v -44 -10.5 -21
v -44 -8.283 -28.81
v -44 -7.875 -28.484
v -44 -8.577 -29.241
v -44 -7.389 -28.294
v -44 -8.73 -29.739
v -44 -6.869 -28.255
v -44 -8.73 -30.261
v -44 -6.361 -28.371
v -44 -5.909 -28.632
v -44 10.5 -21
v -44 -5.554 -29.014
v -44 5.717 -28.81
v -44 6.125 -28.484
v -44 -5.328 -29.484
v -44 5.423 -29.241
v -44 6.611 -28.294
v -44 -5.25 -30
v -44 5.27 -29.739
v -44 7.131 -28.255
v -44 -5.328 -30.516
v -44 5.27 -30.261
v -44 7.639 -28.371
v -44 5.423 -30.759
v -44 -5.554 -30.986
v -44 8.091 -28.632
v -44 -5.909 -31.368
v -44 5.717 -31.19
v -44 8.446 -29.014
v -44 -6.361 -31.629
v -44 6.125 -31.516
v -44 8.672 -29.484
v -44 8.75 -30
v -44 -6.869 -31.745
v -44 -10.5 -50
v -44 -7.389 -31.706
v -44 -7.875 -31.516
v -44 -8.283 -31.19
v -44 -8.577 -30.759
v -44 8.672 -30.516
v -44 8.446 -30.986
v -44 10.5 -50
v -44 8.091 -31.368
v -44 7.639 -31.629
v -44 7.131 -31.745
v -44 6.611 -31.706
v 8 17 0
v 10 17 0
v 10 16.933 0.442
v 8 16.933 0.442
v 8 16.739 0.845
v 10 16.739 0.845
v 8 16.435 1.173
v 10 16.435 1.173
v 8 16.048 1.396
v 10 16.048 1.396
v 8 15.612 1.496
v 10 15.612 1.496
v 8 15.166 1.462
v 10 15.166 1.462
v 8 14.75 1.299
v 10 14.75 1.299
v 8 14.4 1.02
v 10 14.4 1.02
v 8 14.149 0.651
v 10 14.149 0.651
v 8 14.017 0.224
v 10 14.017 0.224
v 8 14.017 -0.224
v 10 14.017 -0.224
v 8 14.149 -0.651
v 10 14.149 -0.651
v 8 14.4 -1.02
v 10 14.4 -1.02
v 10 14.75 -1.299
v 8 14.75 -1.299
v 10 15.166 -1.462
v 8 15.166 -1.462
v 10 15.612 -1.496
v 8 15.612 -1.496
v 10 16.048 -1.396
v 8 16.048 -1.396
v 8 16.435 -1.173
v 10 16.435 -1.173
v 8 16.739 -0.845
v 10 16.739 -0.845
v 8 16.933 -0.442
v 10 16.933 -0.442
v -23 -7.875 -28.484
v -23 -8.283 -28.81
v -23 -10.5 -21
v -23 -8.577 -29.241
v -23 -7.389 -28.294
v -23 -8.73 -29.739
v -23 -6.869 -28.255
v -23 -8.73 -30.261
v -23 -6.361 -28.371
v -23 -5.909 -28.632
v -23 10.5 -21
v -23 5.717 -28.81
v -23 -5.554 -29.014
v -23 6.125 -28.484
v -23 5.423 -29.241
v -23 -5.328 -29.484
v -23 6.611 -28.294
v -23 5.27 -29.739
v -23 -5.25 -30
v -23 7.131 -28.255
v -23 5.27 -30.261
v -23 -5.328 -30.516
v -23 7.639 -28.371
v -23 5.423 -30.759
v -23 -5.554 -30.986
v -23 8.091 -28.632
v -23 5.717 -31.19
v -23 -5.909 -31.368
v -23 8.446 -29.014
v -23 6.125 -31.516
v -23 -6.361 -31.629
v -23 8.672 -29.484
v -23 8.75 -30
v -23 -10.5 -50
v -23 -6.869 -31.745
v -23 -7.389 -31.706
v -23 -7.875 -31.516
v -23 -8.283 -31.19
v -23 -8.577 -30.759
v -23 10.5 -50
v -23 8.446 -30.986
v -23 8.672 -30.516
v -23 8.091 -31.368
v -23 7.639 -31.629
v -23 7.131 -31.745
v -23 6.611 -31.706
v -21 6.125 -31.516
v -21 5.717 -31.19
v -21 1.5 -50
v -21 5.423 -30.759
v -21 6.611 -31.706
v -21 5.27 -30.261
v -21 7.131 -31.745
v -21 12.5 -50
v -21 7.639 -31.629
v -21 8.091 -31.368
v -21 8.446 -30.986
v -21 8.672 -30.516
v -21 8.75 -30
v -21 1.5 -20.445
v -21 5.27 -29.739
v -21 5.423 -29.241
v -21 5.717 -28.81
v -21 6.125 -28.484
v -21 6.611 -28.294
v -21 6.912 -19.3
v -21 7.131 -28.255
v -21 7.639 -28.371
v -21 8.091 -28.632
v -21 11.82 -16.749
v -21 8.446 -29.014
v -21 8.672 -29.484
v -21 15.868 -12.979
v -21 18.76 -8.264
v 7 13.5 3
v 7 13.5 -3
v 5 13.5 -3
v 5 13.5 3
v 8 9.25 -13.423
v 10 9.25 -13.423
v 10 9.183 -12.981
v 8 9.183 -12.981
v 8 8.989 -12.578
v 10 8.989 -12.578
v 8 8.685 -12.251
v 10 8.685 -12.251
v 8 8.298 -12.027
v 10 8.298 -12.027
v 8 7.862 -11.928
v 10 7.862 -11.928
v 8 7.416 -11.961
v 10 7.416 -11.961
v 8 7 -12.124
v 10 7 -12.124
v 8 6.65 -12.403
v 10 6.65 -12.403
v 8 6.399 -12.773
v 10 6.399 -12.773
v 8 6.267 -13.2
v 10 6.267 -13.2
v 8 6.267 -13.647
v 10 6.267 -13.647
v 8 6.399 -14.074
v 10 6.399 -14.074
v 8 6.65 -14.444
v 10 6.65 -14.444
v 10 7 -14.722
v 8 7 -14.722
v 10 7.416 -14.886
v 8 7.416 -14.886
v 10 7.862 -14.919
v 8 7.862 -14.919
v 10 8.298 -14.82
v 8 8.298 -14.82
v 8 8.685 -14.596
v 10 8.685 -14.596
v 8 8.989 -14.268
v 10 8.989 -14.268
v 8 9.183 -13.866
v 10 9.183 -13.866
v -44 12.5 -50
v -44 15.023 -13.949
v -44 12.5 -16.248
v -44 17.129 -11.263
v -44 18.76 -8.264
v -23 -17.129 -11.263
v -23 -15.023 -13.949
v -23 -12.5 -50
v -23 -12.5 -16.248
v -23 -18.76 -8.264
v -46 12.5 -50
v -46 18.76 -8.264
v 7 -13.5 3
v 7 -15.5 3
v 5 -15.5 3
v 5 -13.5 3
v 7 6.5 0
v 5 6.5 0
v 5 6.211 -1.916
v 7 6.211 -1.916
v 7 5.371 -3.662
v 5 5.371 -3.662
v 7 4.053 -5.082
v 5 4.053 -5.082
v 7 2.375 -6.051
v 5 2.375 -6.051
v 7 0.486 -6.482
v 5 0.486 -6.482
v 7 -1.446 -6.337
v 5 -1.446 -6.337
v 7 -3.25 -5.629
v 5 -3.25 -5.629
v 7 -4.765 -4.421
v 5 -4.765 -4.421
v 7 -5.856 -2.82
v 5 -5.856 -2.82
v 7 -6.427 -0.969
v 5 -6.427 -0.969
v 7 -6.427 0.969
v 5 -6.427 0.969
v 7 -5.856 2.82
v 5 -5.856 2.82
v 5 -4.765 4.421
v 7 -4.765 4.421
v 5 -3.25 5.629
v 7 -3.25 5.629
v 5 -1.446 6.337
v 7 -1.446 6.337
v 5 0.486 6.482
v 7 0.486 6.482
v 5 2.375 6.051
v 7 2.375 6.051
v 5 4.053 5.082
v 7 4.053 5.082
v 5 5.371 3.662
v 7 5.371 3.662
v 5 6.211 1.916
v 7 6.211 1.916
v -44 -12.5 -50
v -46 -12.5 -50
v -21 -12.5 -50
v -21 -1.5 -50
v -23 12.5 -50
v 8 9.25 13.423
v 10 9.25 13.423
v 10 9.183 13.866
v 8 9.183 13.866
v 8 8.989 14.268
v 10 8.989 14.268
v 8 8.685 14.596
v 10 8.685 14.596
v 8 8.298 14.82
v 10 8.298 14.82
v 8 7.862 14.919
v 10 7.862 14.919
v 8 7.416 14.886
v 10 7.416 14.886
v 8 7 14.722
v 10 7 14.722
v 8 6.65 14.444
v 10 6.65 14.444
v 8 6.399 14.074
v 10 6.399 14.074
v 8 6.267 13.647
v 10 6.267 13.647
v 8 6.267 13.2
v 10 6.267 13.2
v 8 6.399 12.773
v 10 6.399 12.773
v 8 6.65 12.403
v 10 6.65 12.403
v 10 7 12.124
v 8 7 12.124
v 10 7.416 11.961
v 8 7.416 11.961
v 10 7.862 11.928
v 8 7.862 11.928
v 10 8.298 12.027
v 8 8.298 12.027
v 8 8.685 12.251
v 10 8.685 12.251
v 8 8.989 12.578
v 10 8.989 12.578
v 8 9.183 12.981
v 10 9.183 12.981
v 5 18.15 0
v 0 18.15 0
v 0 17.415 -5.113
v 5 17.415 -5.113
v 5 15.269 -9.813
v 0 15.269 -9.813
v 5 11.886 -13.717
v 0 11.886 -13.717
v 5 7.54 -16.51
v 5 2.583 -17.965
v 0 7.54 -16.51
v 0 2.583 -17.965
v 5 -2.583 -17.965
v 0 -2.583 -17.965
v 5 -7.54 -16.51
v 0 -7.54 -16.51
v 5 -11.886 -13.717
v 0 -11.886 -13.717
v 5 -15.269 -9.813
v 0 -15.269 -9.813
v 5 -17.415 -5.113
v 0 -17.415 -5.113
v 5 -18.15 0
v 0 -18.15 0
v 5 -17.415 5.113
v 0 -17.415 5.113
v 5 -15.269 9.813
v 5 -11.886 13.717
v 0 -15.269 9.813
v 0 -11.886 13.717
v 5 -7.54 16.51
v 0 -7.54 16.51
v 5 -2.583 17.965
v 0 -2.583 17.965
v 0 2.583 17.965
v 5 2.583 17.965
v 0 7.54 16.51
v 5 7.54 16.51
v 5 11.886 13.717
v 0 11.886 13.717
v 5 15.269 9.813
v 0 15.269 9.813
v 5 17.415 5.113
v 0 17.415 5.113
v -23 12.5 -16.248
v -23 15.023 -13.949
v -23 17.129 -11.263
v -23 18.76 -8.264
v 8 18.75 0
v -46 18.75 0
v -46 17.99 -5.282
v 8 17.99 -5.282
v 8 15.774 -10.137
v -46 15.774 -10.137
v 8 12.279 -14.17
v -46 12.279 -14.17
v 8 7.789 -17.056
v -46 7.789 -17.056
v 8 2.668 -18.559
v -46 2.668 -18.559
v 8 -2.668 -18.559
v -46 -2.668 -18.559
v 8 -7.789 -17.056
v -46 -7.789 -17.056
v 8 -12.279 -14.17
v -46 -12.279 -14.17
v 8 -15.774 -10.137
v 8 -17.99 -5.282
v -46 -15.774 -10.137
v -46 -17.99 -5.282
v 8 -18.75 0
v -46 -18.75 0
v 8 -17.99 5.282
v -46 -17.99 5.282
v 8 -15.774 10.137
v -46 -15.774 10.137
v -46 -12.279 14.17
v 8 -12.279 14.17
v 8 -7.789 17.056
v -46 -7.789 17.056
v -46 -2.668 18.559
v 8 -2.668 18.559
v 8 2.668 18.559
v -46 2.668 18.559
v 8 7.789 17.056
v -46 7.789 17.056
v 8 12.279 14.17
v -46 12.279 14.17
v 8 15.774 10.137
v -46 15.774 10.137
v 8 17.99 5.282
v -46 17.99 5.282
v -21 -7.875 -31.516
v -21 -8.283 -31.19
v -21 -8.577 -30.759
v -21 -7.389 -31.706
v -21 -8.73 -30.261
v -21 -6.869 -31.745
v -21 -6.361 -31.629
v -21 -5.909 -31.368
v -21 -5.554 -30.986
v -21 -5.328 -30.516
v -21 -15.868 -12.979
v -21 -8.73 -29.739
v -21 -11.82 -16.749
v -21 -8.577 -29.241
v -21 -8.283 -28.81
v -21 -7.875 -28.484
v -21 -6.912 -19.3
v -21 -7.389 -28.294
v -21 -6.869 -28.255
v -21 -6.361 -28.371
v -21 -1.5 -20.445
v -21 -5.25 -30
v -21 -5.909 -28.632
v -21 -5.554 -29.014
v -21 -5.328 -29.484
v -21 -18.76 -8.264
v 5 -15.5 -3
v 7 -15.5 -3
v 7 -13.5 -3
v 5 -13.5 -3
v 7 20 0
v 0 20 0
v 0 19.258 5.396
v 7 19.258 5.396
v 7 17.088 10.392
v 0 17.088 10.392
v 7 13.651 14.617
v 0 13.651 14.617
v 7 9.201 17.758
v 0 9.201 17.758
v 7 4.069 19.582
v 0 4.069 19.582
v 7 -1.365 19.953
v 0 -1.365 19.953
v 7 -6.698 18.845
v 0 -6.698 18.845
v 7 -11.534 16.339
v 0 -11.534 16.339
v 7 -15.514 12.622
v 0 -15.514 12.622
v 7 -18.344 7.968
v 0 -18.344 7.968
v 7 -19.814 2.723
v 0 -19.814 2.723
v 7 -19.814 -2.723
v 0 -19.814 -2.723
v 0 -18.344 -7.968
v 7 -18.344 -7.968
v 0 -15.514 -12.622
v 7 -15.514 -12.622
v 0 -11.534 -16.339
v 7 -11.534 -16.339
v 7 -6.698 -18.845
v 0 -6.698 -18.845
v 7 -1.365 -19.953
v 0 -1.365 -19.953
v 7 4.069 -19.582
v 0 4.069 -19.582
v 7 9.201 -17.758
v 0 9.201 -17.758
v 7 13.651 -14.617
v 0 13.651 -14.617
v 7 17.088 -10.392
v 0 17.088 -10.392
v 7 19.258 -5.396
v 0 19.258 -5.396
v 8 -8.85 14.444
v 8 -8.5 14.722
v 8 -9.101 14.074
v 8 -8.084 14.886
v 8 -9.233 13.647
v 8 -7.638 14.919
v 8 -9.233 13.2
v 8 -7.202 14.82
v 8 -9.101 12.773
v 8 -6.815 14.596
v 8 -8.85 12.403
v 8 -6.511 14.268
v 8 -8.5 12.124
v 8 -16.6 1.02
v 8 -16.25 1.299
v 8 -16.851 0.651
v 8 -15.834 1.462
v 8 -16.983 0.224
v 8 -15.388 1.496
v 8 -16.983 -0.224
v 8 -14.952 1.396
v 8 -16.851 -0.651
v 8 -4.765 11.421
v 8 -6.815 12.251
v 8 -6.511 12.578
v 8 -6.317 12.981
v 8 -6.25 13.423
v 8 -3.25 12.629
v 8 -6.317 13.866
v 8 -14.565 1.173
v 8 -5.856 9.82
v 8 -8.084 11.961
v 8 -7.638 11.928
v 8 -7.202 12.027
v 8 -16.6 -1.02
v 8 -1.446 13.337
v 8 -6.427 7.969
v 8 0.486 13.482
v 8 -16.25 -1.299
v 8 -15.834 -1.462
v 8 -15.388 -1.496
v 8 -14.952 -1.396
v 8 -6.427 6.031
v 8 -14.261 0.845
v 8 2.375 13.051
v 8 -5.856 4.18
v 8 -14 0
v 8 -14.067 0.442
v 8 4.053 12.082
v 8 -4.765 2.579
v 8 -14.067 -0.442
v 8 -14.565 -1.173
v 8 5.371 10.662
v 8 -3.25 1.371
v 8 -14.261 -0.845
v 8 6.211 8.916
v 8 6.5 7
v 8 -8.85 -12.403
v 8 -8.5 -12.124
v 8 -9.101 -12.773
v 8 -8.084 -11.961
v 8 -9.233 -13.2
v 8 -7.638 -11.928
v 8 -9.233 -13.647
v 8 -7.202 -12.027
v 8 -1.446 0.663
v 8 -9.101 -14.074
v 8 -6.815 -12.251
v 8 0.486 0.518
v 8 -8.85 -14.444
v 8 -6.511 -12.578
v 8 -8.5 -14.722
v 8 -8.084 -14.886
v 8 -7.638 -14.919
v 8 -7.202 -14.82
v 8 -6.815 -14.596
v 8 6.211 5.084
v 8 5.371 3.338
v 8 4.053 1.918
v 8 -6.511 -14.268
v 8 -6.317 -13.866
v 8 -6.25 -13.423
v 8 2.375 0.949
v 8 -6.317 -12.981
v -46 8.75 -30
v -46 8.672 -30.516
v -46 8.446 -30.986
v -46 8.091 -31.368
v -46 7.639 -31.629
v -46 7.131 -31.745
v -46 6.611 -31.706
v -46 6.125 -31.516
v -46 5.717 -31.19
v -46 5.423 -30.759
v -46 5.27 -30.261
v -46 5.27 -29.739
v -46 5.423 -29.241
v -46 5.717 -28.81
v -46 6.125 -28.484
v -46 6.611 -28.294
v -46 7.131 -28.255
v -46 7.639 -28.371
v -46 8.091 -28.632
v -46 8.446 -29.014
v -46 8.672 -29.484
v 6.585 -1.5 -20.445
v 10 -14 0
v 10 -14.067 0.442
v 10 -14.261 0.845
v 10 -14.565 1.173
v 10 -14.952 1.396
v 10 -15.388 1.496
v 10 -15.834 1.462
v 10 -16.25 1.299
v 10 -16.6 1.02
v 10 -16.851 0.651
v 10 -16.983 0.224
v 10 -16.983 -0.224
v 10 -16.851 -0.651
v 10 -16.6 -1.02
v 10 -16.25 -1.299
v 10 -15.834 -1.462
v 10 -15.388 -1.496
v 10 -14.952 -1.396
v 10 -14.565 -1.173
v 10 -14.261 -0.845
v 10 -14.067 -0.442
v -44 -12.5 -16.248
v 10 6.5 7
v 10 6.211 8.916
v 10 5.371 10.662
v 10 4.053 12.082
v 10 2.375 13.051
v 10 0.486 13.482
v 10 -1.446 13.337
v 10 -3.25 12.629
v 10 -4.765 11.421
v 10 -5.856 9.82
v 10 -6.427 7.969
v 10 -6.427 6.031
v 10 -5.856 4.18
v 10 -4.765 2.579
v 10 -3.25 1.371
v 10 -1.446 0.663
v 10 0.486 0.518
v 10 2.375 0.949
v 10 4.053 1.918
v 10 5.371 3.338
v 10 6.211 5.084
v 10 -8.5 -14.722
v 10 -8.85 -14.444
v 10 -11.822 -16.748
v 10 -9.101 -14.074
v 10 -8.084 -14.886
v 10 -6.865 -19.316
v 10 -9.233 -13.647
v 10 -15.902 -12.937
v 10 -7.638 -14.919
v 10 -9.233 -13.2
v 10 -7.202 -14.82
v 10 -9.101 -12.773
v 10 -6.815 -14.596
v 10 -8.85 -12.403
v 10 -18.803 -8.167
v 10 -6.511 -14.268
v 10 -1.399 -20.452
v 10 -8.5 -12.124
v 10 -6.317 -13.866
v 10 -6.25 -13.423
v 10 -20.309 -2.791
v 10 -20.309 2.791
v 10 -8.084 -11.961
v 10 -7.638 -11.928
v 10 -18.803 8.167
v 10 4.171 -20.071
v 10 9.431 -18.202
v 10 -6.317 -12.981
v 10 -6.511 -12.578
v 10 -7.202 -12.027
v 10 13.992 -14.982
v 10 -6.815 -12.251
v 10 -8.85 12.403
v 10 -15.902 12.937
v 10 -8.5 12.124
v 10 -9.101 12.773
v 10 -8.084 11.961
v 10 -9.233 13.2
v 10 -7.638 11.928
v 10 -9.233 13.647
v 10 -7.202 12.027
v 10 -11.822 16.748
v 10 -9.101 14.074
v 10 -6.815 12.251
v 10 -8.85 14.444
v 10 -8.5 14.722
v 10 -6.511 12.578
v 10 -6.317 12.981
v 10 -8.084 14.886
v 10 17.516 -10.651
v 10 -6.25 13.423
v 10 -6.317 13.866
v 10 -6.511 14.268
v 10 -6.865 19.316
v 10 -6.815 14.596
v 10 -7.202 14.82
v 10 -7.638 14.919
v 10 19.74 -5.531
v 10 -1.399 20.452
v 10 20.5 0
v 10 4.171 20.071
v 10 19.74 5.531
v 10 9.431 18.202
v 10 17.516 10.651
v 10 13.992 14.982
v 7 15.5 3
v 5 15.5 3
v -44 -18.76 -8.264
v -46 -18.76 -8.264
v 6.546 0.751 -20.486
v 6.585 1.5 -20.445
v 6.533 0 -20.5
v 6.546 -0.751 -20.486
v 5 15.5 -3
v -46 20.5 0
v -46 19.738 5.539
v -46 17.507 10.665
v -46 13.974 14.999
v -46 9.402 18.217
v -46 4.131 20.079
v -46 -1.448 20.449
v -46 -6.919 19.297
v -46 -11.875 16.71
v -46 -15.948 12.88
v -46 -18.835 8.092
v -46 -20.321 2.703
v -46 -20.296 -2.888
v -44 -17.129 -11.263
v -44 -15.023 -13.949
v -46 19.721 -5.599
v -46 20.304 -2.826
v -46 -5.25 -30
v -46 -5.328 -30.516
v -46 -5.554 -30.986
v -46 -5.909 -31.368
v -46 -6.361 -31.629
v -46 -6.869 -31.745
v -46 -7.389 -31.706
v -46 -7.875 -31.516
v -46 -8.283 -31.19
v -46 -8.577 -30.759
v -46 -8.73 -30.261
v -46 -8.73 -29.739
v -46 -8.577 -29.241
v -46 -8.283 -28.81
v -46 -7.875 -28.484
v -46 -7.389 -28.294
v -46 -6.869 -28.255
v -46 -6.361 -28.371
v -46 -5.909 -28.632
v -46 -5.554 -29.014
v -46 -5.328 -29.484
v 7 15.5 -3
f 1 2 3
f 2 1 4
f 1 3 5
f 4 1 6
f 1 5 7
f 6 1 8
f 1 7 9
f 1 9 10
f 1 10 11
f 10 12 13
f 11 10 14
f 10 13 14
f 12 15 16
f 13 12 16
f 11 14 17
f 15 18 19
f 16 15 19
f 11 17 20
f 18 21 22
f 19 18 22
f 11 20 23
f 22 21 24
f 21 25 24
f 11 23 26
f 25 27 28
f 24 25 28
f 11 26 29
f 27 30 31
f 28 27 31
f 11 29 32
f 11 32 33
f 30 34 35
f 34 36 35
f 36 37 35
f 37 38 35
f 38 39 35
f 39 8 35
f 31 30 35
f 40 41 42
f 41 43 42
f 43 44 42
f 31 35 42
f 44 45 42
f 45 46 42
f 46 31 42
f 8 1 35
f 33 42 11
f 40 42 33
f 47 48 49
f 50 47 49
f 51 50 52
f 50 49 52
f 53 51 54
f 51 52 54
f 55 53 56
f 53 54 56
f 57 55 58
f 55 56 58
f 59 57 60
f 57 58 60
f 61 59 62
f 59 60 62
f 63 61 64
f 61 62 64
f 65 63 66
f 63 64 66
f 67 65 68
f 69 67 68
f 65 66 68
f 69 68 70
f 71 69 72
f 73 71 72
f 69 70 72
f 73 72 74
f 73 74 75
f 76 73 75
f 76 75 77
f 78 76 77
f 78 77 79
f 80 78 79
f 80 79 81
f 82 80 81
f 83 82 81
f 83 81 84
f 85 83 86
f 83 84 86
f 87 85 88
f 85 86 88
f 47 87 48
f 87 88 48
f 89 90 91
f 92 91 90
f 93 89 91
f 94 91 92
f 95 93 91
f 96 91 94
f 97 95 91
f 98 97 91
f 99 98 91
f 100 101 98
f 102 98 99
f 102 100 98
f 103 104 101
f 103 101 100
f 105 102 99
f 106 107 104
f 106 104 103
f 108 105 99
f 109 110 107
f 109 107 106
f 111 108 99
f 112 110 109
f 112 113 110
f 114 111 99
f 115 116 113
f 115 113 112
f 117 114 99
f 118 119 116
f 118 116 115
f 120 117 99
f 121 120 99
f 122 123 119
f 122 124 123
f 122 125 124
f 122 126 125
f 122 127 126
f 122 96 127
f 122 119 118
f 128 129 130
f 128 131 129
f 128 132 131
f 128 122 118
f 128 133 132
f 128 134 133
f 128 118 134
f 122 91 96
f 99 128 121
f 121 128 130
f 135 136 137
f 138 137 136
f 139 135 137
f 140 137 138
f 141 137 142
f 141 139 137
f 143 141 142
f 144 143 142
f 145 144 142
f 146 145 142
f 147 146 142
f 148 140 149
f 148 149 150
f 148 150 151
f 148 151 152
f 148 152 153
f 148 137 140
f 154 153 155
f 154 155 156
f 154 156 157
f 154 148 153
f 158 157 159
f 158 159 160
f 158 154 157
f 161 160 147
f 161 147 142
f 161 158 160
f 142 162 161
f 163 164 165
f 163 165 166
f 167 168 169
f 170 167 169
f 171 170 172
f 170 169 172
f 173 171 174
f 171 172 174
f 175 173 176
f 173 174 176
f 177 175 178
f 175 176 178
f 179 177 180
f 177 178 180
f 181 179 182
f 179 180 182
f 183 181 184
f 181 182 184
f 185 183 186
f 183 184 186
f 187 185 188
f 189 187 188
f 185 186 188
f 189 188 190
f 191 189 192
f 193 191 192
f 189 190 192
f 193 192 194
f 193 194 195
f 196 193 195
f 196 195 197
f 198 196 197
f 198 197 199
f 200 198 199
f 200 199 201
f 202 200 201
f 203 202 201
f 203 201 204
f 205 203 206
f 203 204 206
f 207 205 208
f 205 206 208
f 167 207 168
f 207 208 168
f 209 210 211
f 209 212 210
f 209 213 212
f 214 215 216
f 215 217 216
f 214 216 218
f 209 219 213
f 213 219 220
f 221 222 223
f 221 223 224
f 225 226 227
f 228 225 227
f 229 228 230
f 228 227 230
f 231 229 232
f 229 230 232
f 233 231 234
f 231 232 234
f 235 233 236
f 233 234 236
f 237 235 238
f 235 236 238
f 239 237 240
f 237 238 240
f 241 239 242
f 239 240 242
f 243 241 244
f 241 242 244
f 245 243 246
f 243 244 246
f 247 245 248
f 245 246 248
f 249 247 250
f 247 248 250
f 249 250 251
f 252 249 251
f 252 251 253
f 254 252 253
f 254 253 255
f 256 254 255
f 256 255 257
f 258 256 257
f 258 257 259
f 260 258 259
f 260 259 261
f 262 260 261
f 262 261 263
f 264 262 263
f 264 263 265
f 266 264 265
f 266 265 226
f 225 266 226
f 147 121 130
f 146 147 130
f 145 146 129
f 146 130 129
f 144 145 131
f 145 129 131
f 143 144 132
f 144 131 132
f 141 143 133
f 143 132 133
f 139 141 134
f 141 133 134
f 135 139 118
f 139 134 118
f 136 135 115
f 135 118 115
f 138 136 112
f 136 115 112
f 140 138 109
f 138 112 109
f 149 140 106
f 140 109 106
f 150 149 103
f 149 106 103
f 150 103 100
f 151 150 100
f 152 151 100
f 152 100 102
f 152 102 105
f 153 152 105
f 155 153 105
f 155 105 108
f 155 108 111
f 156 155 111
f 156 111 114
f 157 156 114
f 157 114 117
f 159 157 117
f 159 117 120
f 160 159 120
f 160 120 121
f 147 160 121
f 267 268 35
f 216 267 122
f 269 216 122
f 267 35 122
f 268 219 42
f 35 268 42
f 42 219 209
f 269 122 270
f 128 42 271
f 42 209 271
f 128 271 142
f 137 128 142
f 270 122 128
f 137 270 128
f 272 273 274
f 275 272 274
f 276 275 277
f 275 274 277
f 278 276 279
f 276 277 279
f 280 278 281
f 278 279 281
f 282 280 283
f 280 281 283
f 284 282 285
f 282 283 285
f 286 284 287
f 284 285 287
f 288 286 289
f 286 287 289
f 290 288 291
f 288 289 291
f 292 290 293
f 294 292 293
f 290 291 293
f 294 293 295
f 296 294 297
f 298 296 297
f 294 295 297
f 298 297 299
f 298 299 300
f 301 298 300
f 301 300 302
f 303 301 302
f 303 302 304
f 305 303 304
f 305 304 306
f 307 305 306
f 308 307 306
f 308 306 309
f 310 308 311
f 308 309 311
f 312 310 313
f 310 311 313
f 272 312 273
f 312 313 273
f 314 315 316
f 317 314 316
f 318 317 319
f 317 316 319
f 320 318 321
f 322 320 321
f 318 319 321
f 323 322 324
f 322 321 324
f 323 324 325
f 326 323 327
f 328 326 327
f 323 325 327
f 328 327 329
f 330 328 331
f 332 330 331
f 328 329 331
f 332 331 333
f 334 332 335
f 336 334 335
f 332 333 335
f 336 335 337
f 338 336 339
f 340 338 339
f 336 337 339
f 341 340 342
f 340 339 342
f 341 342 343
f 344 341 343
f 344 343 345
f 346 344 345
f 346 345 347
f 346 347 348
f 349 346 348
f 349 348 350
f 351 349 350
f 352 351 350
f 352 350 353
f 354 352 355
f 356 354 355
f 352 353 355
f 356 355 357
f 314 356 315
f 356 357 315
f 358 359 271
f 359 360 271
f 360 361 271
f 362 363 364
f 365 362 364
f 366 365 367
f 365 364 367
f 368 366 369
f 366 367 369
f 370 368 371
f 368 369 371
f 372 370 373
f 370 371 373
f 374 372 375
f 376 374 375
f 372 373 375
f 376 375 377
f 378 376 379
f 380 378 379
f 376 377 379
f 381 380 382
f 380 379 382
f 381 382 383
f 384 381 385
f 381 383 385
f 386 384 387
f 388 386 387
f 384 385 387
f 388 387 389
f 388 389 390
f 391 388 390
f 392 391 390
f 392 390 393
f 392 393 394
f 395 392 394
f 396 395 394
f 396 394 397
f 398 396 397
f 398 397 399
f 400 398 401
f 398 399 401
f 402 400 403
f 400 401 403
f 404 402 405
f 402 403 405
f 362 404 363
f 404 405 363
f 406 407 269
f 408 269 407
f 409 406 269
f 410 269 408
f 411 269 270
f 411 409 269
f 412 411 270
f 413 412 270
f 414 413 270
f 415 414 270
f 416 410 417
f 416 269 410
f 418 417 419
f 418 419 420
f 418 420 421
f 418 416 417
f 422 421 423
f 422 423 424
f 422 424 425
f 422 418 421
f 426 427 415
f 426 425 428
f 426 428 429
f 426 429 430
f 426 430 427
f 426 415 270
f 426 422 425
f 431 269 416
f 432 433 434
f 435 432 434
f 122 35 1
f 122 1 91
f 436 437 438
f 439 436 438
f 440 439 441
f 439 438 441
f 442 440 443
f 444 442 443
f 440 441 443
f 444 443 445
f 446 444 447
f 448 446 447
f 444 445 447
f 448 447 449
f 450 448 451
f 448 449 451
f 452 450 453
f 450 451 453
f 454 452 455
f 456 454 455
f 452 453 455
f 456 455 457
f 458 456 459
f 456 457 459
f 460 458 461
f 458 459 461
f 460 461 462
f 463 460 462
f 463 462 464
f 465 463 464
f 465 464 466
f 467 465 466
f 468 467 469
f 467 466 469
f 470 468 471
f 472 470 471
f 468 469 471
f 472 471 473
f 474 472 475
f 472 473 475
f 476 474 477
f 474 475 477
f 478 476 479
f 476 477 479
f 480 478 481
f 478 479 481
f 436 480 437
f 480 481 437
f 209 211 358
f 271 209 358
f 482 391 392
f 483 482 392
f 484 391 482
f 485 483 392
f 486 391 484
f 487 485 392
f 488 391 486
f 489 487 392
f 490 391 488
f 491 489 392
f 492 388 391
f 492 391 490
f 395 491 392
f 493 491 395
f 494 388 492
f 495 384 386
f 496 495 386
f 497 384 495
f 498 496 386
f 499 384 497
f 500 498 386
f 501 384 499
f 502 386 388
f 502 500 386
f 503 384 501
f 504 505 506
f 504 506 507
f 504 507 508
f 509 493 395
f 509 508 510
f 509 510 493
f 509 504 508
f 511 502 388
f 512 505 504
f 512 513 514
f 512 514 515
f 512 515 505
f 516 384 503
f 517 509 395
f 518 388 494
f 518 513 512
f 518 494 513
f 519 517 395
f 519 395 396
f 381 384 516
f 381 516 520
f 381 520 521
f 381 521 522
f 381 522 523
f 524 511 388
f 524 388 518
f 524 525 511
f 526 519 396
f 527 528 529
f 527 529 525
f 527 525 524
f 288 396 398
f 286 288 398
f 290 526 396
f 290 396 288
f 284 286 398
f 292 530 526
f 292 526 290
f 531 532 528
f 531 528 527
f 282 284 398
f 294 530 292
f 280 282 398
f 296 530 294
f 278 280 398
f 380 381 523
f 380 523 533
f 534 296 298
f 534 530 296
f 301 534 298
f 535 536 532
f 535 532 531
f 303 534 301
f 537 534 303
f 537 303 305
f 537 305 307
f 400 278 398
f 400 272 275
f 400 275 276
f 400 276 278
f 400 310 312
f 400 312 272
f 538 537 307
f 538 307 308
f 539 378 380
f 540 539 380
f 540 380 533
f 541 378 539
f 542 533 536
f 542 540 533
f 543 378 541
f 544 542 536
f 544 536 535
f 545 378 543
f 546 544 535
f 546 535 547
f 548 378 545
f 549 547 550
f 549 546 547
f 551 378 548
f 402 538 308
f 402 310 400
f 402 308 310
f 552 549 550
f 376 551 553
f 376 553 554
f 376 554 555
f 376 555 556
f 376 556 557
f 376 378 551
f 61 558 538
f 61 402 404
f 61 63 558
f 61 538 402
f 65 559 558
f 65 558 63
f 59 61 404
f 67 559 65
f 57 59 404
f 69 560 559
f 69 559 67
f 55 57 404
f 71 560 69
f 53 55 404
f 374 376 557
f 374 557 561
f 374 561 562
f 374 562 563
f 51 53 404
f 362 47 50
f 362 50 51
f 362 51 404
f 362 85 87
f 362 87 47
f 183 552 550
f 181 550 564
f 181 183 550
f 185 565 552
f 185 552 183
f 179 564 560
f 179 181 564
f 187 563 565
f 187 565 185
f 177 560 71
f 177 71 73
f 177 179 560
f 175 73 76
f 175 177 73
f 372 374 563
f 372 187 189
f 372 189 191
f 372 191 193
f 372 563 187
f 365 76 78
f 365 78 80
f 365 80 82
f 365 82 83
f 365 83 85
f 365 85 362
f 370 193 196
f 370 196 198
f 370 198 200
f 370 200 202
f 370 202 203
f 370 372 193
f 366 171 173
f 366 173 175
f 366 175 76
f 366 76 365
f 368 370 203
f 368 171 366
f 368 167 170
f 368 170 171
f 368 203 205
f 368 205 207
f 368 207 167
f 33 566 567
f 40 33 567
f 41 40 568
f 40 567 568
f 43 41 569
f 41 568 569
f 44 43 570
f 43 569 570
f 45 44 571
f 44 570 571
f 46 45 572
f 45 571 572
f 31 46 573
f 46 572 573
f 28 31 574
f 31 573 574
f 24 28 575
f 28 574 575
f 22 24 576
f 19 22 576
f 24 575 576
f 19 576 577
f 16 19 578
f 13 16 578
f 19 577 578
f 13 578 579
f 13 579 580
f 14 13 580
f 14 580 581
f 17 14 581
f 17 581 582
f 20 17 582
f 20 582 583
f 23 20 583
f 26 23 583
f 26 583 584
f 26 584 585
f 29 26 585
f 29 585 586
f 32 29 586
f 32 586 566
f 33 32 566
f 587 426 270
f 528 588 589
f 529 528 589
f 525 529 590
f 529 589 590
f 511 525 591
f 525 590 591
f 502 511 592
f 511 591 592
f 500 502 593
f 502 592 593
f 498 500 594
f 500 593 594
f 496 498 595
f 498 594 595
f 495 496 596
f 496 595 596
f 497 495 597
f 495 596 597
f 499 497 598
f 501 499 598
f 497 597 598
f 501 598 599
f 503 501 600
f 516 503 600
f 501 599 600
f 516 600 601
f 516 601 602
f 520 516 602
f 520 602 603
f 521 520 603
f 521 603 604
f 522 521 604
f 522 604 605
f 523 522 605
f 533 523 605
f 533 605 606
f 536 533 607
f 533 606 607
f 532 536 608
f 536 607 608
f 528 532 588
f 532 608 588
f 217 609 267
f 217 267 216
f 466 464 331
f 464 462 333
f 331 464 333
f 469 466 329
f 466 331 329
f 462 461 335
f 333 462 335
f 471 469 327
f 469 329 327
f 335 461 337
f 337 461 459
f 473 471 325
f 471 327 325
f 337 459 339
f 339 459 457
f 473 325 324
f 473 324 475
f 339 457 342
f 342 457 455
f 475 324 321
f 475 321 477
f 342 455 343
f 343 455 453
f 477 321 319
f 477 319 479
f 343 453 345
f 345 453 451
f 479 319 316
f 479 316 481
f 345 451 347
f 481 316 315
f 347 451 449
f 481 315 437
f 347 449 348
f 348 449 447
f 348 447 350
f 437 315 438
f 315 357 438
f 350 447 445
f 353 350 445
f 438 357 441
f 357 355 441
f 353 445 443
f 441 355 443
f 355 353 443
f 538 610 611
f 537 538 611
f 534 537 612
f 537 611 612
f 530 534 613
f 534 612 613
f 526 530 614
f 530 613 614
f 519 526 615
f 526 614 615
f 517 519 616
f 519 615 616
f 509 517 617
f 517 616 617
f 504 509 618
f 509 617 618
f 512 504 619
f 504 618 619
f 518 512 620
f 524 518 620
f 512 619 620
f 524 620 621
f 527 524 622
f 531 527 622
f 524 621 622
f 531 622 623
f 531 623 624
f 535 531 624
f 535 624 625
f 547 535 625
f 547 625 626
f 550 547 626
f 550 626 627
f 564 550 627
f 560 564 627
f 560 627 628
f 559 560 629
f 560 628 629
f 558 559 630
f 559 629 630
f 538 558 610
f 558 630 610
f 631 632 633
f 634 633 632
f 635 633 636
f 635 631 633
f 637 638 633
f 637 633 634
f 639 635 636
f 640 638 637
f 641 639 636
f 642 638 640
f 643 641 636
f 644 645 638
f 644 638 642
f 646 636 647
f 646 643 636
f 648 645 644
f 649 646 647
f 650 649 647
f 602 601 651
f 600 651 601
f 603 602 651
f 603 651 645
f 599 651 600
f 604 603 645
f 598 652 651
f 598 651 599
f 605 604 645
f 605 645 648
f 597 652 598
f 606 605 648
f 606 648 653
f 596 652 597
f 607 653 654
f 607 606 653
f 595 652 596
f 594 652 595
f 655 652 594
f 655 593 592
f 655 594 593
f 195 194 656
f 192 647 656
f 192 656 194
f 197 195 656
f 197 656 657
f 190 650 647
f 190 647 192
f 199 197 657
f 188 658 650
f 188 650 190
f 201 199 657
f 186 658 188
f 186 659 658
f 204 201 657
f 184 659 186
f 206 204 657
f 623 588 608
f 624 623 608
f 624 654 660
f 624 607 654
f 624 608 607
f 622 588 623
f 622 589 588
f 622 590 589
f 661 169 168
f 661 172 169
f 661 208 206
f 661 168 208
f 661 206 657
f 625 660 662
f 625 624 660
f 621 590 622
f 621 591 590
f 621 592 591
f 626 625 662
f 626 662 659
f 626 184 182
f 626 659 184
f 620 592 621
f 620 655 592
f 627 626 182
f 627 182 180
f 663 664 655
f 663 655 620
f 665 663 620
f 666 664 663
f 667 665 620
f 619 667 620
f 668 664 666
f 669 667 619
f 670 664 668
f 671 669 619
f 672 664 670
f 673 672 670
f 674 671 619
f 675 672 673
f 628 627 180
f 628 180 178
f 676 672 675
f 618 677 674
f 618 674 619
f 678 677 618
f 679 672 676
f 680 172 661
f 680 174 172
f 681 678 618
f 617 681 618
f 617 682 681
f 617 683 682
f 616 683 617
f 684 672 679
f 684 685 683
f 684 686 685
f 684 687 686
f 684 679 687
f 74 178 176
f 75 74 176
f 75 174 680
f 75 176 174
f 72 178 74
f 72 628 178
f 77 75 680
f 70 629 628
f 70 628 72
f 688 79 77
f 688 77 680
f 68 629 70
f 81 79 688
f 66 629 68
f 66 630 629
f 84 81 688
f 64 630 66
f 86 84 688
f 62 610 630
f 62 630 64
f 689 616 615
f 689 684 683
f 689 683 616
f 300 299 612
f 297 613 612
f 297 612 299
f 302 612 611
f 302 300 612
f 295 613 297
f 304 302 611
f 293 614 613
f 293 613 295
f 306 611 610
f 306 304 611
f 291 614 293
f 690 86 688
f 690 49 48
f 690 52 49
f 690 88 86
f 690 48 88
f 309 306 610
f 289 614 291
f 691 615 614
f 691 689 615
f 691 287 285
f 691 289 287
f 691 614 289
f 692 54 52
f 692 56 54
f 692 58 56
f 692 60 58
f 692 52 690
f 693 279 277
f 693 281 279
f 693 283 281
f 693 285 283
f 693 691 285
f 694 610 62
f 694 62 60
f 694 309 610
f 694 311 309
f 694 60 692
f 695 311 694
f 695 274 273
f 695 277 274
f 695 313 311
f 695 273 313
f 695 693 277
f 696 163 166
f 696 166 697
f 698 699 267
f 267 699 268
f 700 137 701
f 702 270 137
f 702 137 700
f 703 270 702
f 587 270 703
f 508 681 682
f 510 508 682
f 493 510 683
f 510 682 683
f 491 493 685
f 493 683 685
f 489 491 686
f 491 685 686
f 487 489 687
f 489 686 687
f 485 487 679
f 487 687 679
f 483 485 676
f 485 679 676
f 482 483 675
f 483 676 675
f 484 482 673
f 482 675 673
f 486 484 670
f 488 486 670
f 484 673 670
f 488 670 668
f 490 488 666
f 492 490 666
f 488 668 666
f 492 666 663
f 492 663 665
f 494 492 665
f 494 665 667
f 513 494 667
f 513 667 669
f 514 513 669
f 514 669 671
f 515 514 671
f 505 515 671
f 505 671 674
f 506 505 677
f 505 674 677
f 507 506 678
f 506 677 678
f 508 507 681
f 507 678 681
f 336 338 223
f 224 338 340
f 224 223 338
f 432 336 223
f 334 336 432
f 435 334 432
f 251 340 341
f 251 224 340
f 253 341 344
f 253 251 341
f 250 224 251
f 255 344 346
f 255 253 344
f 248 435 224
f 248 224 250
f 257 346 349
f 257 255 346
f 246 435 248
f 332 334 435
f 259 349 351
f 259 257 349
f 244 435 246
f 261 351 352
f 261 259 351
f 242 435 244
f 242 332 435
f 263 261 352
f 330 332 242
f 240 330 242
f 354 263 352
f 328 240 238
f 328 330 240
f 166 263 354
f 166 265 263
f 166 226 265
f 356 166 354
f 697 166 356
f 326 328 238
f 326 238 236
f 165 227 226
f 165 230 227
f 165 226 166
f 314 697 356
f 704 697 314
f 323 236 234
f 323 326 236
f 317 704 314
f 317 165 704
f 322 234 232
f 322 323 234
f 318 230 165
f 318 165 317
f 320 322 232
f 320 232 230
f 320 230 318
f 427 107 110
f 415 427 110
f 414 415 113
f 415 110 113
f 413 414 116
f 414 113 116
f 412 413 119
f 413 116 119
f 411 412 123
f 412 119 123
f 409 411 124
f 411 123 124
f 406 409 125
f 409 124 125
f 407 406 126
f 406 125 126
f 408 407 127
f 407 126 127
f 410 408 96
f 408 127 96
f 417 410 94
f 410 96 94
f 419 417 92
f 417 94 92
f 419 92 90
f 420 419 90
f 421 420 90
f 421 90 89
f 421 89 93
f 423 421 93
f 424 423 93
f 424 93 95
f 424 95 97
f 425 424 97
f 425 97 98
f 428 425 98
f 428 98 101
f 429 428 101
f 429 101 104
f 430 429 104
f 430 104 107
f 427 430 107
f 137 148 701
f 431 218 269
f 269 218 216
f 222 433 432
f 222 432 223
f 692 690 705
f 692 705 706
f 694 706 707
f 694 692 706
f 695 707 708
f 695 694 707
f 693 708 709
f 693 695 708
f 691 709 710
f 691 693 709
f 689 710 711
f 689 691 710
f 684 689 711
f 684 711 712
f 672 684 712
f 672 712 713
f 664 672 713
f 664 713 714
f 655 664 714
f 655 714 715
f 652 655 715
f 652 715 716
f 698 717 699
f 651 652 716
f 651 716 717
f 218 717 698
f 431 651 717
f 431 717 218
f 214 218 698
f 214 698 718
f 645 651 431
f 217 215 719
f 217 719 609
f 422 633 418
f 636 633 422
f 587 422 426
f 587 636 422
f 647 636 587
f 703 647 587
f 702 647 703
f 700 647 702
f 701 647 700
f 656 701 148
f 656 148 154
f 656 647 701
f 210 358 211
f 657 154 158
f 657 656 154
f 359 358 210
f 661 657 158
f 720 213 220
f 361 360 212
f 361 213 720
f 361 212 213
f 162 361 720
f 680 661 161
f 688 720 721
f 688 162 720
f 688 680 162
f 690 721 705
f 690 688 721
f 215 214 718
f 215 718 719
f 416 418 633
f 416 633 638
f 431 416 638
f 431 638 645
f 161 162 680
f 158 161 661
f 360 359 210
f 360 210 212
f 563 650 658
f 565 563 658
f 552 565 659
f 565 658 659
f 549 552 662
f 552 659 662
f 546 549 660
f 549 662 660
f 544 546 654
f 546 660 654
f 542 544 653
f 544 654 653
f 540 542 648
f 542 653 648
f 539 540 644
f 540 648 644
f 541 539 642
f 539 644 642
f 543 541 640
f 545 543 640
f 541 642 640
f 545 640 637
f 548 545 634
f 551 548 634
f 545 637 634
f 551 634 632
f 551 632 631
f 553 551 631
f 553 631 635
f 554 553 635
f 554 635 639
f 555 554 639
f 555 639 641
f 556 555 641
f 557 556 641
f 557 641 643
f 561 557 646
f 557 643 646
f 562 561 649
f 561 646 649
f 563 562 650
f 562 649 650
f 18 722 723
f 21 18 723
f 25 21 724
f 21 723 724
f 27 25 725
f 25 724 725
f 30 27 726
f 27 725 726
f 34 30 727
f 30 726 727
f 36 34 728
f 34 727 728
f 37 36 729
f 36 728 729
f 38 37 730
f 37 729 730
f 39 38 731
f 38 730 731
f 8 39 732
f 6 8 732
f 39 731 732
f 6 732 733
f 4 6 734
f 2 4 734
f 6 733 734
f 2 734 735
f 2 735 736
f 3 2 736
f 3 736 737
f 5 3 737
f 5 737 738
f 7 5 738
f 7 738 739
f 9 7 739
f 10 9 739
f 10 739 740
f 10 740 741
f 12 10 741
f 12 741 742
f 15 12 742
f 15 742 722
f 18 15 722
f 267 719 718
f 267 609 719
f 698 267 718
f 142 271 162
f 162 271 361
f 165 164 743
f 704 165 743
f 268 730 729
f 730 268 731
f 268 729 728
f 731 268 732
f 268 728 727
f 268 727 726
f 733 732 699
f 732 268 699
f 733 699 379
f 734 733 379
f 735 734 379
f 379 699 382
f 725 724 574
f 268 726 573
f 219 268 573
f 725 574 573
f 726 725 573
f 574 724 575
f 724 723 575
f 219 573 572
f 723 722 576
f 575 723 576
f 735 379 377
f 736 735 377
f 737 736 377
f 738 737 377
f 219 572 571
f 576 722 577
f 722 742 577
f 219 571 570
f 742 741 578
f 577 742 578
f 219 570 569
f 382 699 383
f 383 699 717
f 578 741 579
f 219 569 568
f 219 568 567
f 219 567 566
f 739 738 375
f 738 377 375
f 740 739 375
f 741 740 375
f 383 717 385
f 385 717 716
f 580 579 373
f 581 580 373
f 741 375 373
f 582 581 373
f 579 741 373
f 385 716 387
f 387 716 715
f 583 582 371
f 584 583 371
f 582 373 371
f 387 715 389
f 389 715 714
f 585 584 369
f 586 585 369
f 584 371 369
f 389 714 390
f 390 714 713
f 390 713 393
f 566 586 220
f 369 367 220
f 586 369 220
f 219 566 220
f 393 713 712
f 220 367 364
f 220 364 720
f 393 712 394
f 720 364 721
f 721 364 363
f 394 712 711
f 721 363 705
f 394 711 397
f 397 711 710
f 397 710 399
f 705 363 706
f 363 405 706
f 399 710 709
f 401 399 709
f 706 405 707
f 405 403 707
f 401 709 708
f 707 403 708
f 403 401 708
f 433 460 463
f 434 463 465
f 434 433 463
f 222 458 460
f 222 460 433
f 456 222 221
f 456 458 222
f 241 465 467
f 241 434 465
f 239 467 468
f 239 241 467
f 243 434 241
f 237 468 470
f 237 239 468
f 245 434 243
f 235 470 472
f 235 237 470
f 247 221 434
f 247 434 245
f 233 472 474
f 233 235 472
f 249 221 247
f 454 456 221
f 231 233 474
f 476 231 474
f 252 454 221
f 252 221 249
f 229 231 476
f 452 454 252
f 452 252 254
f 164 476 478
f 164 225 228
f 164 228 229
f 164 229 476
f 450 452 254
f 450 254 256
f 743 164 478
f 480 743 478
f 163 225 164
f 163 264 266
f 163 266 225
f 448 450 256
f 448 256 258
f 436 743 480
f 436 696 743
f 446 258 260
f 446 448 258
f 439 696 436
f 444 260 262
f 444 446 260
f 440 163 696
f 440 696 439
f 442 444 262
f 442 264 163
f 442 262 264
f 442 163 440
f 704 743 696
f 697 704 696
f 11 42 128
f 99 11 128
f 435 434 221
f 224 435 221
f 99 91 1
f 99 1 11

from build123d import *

# Parameters (mm, degrees)
SKETCH009_R            = 20
PAD005_DEPTH           = 7
SKETCH010_R            = 18.15
POCKET004_DEPTH        = 5
SKETCH011_R            = 6.5
POCKET005_DEPTH        = 2.001
SKETCH012_W            = 2
SKETCH012_H            = 6
POCKET006_DEPTH        = 7.001
SKETCH018_R            = 20.5
PAD006_DEPTH           = 10
PAD006_DEPTH_BACK      = 46
SKETCH019_R            = 6.5
SKETCH019_R_2          = 1.5
POCKET007_DEPTH        = 2
SKETCH013_W            = 25
SKETCH013_H            = 25
PAD009_DEPTH           = 50
PAD008_DEPTH           = 2
LINEARPATTERN001_COUNT = 2
LINEARPATTERN001_PITCH = 23
SKETCH017_R            = 18.75
POCKET008_DEPTH        = 54
SKETCH020_R            = 1.75
POCKET010_DEPTH        = 56.001
PAD010_DEPTH           = 1.5
SKETCH022_W            = 21
SKETCH022_H            = 21
POCKET011_DEPTH        = 29


with BuildPart() as back:
    # Sketch009 → Pad005 (new body)
    with BuildSketch(Plane.YZ):
        Circle(SKETCH009_R)
    extrude(amount=PAD005_DEPTH)

    # Sketch010 (on Face2 of Pad005) → Pocket004 (cut)
    with BuildSketch(Plane(origin=(0, 0, 0), x_dir=(0, 1, 0), z_dir=(-1, 0, 0))):
        Circle(SKETCH010_R)
    extrude(amount=-POCKET004_DEPTH, mode=Mode.SUBTRACT)

    # Sketch011 (on Face5 of Pocket004) → Pocket005 (cut, through all)
    with BuildSketch(Plane(origin=(5, 0, 0), x_dir=(0, 1, 0), z_dir=(-1, 0, 0))):
        Circle(SKETCH011_R)
    extrude(amount=-POCKET005_DEPTH, mode=Mode.SUBTRACT)

    # Sketch012 (on Face3 of Pocket005) → Pocket006 (cut, through all)
    with BuildSketch(Plane.YZ.offset(7)):
        with Locations((-14.5, 0)):
            Rectangle(SKETCH012_W, SKETCH012_H)
        with Locations((14.5, 0)):
            Rectangle(SKETCH012_W, SKETCH012_H)
    extrude(amount=-POCKET006_DEPTH, mode=Mode.SUBTRACT)


with BuildPart() as body:
    # Sketch018 → Pad006 (new body, two sides)
    with BuildSketch(Plane.YZ) as pad006_sk:
        Circle(SKETCH018_R)
    extrude(amount=PAD006_DEPTH)
    extrude(pad006_sk.sketch, amount=-PAD006_DEPTH_BACK)

    # Sketch019 → Pocket007 (cut)
    with BuildSketch(Plane.YZ.offset(10)):
        with Locations((0, 7)):
            Circle(SKETCH019_R)
        with Locations((7.75, -13.423394)):
            Circle(SKETCH019_R_2)
        with Locations((15.5, 0)):
            Circle(SKETCH019_R_2)
        with Locations((-15.5, 0)):
            Circle(SKETCH019_R_2)
        with Locations((-7.75, -13.423394)):
            Circle(SKETCH019_R_2)
        with Locations((7.75, 13.423394)):
            Circle(SKETCH019_R_2)
        with Locations((-7.75, 13.423394)):
            Circle(SKETCH019_R_2)
    extrude(amount=-POCKET007_DEPTH, mode=Mode.SUBTRACT)

    # Sketch013 → Pad009 (join)
    with BuildSketch(Plane.XY):
        with Locations((-33.5, 0)):
            Rectangle(SKETCH013_W, SKETCH013_H)
    extrude(amount=-PAD009_DEPTH)

    # Sketch016 → Pad008 (join)
    with BuildSketch(Plane(origin=(-46, 0, 0), x_dir=(0, 1, 0), z_dir=(-1, 0, 0))):
        Polygon((20, 0), (-20, 0), (-12.5, 50), (12.5, 50), align=None)
    pad008 = extrude(amount=-PAD008_DEPTH)

    # LinearPattern001: Pad008 ×2
    with Locations(*[(i * LINEARPATTERN001_PITCH, 0, 0) for i in range(1, LINEARPATTERN001_COUNT)]):
        add(pad008)

    # Sketch017 (on Face2 of Pad006) → Pocket008 (cut)
    with BuildSketch(Plane(origin=(-46, 0, 0), x_dir=(0, 1, 0), z_dir=(-1, 0, 0))):
        Circle(SKETCH017_R)
    extrude(amount=-POCKET008_DEPTH, mode=Mode.SUBTRACT)

    # Sketch020 → Pocket010 (cut, through all)
    with BuildSketch(Plane(origin=(-46, 0, 0), x_dir=(0, 1, 0), z_dir=(-1, 0, 0))):
        with Locations((-7, 30)):
            Circle(SKETCH020_R)
        with Locations((7, 30)):
            Circle(SKETCH020_R)
    extrude(amount=-POCKET010_DEPTH, mode=Mode.SUBTRACT)

    # Sketch021 → Pad010 (join, symmetric)
    with BuildSketch(Plane.XZ):
        Polygon((7, -20), (-21, -20), (-21, -50), align=None)
    extrude(amount=PAD010_DEPTH, both=True)

    # Sketch022 (on Face6 of Pad010) → Pocket011 (cut)
    with BuildSketch(Plane.YX.offset(50)):
        with Locations((0, -33.5)):
            Rectangle(SKETCH022_W, SKETCH022_H)
    extrude(amount=-POCKET011_DEPTH, mode=Mode.SUBTRACT)


solid = Compound([back.part, body.part])
